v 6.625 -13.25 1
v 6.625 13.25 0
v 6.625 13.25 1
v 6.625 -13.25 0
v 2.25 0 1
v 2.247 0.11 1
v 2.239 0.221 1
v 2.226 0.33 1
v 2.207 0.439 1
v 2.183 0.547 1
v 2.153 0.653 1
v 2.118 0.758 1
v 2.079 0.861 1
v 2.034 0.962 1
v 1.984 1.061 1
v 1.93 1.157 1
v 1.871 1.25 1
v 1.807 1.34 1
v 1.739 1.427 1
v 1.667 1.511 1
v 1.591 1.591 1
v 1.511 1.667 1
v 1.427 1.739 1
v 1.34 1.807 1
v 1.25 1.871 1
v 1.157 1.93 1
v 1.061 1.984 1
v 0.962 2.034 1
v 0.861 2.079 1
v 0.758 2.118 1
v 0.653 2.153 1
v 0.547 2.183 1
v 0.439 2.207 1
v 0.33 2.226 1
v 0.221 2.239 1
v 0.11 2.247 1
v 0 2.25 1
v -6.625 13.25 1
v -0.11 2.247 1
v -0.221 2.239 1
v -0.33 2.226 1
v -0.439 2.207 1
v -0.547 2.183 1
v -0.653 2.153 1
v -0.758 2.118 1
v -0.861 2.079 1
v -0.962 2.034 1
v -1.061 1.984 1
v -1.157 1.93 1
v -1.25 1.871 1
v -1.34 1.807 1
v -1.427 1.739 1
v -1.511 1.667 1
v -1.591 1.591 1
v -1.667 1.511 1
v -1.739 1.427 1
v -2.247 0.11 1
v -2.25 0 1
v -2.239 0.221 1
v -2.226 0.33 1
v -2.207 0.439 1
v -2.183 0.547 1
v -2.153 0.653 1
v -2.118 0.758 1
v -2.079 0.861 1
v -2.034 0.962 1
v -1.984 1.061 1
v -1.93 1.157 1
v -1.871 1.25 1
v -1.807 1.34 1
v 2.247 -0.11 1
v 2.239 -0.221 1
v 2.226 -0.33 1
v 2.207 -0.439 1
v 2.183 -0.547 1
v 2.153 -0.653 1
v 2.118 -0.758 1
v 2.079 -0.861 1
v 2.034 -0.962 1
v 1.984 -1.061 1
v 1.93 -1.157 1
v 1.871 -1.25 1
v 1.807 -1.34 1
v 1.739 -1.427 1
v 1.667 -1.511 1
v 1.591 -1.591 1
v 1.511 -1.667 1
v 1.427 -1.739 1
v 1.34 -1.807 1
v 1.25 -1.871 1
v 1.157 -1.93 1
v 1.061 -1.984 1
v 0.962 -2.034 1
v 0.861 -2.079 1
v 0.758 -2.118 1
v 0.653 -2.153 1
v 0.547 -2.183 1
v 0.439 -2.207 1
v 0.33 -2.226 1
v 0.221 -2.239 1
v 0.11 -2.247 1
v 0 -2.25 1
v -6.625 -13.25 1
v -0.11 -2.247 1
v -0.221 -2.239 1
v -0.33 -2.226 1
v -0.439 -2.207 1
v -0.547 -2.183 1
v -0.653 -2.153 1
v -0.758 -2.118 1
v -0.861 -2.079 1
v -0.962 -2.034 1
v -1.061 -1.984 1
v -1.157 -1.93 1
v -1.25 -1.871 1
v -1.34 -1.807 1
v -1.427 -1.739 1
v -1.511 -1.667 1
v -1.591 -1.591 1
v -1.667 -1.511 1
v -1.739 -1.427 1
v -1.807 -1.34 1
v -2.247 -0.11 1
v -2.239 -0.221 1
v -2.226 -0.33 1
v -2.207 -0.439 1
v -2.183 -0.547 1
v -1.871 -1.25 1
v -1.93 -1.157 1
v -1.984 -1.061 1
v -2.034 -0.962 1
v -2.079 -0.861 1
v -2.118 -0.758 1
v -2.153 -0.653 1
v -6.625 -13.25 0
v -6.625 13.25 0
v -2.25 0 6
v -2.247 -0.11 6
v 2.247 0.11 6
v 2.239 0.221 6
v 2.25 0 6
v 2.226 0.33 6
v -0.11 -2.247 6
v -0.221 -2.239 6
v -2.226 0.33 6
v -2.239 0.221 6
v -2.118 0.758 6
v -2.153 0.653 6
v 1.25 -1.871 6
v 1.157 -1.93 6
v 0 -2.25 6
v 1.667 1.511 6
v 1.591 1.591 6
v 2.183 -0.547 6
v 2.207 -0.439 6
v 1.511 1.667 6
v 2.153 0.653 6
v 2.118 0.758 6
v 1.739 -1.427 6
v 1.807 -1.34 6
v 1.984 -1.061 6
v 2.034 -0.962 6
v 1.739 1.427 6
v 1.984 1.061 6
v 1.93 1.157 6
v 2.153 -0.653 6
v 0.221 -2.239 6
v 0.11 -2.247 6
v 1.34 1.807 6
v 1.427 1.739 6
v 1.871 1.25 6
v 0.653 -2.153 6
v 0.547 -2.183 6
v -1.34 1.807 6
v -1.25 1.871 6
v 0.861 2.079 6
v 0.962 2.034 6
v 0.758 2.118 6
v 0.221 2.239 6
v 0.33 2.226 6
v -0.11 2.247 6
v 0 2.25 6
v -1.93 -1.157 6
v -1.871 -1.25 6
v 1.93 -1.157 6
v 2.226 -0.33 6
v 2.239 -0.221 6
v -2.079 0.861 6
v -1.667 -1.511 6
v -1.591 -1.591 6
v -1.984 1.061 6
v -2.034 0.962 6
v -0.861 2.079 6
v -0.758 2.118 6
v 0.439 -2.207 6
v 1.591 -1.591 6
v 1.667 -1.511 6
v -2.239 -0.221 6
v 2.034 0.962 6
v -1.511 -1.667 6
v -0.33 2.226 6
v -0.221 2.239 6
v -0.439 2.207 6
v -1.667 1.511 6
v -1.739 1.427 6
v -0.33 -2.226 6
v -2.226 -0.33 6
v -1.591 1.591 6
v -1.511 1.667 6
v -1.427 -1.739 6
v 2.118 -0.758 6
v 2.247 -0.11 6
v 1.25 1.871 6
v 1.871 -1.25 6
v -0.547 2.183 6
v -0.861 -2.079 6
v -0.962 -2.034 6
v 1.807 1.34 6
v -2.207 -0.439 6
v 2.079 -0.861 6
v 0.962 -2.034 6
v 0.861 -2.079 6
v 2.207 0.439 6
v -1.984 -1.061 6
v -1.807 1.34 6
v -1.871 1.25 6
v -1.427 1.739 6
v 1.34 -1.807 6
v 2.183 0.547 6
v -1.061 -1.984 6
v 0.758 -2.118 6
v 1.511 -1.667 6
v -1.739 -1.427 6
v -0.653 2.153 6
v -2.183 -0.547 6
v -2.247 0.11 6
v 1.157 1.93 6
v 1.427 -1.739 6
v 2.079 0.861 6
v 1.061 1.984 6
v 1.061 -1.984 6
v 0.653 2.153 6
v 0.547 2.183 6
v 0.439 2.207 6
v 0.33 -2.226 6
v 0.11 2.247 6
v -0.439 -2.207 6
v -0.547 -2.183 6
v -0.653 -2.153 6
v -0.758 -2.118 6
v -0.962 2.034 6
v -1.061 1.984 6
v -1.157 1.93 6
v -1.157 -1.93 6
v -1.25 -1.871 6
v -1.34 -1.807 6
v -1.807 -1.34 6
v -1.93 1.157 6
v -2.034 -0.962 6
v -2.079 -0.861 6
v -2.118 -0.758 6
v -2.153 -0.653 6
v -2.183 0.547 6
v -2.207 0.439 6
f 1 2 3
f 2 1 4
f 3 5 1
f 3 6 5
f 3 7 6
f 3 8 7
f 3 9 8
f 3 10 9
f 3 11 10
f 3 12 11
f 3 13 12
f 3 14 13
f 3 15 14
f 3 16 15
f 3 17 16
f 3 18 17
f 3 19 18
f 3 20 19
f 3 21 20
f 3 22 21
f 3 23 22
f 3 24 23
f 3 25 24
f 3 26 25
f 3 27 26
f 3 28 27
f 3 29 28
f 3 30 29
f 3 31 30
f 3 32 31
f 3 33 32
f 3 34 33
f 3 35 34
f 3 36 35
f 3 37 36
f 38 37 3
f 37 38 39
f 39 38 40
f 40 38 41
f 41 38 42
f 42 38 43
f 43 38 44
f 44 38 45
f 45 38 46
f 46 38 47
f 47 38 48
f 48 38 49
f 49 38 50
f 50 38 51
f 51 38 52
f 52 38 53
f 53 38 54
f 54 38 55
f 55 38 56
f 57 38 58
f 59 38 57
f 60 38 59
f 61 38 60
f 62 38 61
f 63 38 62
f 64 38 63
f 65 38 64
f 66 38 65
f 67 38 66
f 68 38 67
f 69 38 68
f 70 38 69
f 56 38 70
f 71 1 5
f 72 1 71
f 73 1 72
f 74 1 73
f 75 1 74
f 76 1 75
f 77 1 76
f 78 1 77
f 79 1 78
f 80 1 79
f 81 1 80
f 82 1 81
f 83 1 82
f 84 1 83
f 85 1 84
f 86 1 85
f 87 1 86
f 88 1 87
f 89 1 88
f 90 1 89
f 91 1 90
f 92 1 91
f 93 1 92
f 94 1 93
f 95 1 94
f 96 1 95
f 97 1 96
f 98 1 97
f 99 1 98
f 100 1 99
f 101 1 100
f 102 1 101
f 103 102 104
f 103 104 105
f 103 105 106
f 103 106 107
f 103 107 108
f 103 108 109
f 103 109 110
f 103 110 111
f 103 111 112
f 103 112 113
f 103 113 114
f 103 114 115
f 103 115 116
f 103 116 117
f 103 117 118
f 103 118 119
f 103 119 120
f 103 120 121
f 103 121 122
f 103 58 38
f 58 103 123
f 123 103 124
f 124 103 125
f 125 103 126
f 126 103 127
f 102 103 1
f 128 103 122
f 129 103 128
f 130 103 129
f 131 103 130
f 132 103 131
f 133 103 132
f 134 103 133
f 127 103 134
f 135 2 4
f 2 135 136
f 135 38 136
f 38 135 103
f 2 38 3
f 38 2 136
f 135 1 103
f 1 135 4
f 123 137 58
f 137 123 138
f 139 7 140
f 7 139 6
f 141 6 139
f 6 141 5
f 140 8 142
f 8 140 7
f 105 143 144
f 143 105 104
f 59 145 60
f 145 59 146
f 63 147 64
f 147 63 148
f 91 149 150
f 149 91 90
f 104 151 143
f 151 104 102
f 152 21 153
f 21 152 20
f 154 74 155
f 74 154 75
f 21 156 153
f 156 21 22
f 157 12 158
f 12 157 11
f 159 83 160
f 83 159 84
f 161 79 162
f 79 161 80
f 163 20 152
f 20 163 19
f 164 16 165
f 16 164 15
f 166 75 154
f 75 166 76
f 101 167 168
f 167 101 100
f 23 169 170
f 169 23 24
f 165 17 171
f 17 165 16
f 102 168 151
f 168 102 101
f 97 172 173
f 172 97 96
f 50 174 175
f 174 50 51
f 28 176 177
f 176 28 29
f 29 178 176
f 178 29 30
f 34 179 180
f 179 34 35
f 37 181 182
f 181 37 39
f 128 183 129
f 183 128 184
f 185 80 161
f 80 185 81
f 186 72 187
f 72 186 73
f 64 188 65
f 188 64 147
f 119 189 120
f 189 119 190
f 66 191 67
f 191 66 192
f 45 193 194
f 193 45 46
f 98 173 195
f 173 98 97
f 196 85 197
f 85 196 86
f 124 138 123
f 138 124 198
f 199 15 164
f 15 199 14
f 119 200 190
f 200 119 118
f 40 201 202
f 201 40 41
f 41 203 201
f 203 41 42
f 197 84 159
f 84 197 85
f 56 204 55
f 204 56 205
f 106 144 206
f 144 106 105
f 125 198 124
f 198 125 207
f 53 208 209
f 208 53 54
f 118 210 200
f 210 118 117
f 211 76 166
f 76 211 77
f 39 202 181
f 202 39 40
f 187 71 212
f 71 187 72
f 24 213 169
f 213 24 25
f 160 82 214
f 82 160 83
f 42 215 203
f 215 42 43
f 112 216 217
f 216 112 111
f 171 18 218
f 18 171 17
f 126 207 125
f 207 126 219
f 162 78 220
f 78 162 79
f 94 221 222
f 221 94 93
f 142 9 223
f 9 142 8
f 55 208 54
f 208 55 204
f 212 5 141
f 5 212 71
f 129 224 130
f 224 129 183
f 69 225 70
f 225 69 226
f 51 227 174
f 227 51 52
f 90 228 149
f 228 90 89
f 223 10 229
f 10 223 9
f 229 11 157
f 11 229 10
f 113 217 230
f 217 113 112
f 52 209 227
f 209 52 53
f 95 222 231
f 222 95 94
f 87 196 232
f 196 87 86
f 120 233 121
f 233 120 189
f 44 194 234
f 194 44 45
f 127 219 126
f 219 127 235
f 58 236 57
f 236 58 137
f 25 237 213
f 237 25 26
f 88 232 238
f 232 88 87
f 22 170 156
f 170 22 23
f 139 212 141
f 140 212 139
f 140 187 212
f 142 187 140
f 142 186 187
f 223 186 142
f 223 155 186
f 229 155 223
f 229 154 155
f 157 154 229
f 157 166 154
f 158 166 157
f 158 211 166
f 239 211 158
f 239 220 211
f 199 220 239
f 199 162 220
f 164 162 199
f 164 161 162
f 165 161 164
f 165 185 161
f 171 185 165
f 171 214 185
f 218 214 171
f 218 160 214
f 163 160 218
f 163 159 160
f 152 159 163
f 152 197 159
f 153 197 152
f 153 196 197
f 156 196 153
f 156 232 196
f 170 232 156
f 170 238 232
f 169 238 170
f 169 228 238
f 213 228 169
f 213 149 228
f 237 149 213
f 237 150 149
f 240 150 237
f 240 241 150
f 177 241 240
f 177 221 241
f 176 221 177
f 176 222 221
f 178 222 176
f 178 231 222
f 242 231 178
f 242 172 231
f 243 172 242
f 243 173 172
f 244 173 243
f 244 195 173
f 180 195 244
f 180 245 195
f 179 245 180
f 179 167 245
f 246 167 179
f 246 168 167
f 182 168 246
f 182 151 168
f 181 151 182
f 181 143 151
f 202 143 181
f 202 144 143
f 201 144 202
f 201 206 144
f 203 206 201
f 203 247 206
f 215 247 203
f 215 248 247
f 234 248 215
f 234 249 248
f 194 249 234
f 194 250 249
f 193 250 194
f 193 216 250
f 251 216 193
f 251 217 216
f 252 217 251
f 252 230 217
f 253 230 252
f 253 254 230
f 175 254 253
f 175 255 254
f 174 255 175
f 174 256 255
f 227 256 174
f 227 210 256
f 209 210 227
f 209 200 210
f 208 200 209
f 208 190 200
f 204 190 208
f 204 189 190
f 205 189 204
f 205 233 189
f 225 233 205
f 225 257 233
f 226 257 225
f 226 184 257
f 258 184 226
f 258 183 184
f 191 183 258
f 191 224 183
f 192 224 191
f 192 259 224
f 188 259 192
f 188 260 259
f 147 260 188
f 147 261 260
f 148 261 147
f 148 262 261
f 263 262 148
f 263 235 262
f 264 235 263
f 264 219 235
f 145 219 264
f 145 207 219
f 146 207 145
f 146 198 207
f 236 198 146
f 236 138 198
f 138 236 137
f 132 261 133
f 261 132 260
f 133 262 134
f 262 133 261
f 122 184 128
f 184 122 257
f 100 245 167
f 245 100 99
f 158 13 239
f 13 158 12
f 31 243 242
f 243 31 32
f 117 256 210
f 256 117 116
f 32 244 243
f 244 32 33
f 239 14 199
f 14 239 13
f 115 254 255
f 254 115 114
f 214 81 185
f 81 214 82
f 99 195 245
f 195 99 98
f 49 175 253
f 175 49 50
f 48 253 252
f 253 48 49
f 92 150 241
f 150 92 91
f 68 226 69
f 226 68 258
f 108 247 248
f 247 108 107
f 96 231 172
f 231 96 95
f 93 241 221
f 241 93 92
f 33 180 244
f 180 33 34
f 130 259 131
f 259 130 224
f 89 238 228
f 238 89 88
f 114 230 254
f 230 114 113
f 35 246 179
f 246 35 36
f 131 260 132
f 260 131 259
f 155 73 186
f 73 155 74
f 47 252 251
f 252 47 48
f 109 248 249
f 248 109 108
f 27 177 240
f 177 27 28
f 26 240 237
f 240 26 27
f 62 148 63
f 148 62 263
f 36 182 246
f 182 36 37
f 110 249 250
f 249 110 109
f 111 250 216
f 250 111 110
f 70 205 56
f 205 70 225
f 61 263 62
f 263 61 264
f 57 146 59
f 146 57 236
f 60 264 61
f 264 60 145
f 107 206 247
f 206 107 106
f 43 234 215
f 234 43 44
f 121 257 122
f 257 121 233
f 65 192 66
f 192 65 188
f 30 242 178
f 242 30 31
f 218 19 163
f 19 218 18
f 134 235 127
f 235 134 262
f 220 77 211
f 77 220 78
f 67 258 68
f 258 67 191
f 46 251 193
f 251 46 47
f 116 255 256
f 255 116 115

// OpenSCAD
/* RailEduKit/InteractiveSignallingLaboratory © 2025 by Martin Scheidt and contributors
 * License: CC-BY 4.0 - https://creativecommons.org/licenses/by/4.0/
 * Project description: The Interactive Signalling Laboratory is a tool for training in Rail
 * Applications to enhance the knowledge of control and signalling principles for rail transport systems.
 *
 * Module: Balise
 */

// Include configuration file
include <config/global_variables.scad>

module balise() {
	translate([ 0, 0, balise_height / 2 ])
	cube([ balise_width, balise_depth, balise_height ], center = true);
	translate([ 0, 0, balise_height ])
	cylinder(d = balise_pin_diameter, h = balise_pin_height);
}

balise();
